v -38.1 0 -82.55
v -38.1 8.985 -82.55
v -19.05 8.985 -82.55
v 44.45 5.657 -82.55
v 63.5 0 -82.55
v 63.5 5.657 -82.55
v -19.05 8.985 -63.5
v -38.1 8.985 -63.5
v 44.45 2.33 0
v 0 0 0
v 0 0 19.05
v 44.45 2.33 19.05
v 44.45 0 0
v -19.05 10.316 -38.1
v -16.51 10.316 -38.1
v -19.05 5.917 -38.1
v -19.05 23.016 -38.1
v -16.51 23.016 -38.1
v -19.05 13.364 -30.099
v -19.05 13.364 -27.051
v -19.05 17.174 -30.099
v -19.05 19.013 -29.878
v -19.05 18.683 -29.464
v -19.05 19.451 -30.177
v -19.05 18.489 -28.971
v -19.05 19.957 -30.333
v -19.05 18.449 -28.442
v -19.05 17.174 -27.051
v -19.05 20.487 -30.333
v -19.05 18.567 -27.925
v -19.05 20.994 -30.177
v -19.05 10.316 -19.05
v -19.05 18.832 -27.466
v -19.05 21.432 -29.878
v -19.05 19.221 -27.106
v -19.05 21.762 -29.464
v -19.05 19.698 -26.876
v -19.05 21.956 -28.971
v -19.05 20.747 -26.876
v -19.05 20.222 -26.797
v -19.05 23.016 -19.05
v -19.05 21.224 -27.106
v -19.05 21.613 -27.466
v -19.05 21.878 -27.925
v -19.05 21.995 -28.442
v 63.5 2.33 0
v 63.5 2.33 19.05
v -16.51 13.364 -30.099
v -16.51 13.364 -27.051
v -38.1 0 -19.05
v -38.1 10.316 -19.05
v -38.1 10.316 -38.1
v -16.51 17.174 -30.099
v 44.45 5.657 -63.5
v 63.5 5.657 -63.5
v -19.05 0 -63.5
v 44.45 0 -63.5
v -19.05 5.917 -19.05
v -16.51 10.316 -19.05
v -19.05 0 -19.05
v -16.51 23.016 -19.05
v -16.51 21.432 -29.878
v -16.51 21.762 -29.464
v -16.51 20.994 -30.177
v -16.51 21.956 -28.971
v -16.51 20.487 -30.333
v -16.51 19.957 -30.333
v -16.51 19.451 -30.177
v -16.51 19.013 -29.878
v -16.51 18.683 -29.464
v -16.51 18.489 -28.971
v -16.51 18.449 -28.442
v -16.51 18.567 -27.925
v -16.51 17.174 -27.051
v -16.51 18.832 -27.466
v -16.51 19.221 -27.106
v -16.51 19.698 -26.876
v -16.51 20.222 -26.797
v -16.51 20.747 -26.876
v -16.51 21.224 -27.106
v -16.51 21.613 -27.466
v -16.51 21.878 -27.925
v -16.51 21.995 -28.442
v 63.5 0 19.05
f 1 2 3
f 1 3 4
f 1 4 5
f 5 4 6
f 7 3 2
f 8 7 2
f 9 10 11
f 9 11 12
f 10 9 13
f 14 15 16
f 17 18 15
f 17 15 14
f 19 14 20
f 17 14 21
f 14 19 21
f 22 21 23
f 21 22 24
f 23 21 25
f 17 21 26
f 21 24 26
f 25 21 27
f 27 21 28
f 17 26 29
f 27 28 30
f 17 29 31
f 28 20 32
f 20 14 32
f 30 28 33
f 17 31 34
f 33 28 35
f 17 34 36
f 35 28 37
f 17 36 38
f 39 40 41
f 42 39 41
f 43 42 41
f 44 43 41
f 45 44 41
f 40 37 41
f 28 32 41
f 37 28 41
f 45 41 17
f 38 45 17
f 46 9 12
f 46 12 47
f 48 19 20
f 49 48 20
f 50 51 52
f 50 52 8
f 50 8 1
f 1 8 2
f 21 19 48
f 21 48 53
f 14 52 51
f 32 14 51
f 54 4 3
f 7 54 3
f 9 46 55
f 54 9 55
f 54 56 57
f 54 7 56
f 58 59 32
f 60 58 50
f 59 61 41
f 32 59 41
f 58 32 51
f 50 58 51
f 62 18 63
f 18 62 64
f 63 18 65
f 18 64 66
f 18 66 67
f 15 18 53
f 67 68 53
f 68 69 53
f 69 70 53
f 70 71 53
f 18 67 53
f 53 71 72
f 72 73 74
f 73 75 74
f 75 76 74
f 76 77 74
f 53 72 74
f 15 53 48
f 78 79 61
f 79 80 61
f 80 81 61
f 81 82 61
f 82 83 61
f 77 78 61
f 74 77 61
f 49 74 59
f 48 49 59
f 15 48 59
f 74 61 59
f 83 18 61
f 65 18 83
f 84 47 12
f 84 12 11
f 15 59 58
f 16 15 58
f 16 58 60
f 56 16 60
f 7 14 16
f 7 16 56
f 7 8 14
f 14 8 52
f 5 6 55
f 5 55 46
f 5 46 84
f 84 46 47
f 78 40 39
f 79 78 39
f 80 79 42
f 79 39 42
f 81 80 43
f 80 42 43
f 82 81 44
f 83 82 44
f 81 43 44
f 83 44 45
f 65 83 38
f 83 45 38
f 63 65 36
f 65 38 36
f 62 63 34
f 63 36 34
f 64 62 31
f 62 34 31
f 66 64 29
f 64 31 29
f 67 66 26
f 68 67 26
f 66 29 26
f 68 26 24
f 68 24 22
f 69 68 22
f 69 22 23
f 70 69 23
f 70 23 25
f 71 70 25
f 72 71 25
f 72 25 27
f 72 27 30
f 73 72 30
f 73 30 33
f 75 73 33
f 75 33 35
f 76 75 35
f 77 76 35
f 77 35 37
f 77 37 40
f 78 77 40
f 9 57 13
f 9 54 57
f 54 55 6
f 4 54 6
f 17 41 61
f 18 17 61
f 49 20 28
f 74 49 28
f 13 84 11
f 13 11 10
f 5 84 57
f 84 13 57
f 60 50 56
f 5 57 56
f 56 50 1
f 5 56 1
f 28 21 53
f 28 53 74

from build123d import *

# Parameters (mm, degrees)
BOSS_EXTRUDE1_DEPTH  = 19.05
BOSS_EXTRUDE2_DEPTH  = 19.05
BOSS_EXTRUDE3_DEPTH  = 19.05
BOSS_EXTRUDE4_DEPTH  = 19.05
BOSS_EXTRUDE13_DEPTH = 19.05
CUT_EXTRUDE1_REACH   = 84.55
SKETCH14_R           = 1.778
SKETCH14_W           = 3.048
SKETCH14_H           = 3.81


with BuildPart() as part:
    # Sketch1 → Boss-Extrude1 (new body)
    with BuildSketch(Plane.XY):
        Polygon((0, 0), (44.45, 2.329525789), (63.5, 2.329525789), (63.5, 0), align=None)
    extrude(amount=BOSS_EXTRUDE1_DEPTH)

    # Sketch2 → Boss-Extrude2 (add)
    with BuildSketch(Plane(origin=(63.5, 0, 0), x_dir=(0, 0, -1), z_dir=(1, 0, 0))):
        Polygon((0, 0), (0, 2.329525789), (63.5, 5.657419774), (82.55, 5.657419774), (82.55, 0), align=None)
    extrude(amount=-BOSS_EXTRUDE2_DEPTH)

    # Sketch3 → Boss-Extrude3 (add)
    with BuildSketch(Plane(origin=(0, 0, -82.55), x_dir=(-1, 0, 0), z_dir=(0, 0, -1))):
        Polygon((-44.45, 0), (-44.45, 5.657419774), (19.05, 8.985313758), (38.1, 8.985313758), (38.1, 0), align=None)
    extrude(amount=-BOSS_EXTRUDE3_DEPTH)

    # Sketch4 → Boss-Extrude4 (add)
    with BuildSketch(Plane.ZY.offset(38.1)):
        Polygon((-63.5, 8.985313758), (-38.1, 10.316471352), (-19.05, 10.316471352), (-19.05, 0), (-63.5, 0), align=None)
    extrude(amount=-BOSS_EXTRUDE4_DEPTH)

    # Sketch13 → Boss-Extrude13 (add)
    with BuildSketch(Plane.XY.offset(-19.05)):
        Polygon((-19.05, 5.917062301), (-19.05, 23.016471352), (-16.51, 23.016471352), (-16.51, 10.316471352), align=None)
    extrude(amount=-BOSS_EXTRUDE13_DEPTH)

    # Sketch14 → Cut-Extrude1 (cut, up to next)
    with BuildSketch(Plane.ZY.offset(19.05), mode=Mode.PRIVATE) as cut_extrude1_sk1:
        with Locations((-28.575, 20.222471352)):
            Circle(SKETCH14_R)
    cut_extrude1_tool1 = extrude(cut_extrude1_sk1.sketch, amount=-CUT_EXTRUDE1_REACH, mode=Mode.PRIVATE) & part.part
    add(cut_extrude1_tool1.solids().sort_by_distance((-19.05, 20.222471, -28.575))[0], mode=Mode.SUBTRACT)
    # Sketch14 → Cut-Extrude1 (cut, up to next)
    with BuildSketch(Plane.ZY.offset(19.05), mode=Mode.PRIVATE) as cut_extrude1_sk2:
        with Locations((-28.575, 15.269471352)):
            Rectangle(SKETCH14_W, SKETCH14_H)
    cut_extrude1_tool2 = extrude(cut_extrude1_sk2.sketch, amount=-CUT_EXTRUDE1_REACH, mode=Mode.PRIVATE) & part.part
    add(cut_extrude1_tool2.solids().sort_by_distance((-19.05, 15.269471, -28.575))[0], mode=Mode.SUBTRACT)


solid = part.part
